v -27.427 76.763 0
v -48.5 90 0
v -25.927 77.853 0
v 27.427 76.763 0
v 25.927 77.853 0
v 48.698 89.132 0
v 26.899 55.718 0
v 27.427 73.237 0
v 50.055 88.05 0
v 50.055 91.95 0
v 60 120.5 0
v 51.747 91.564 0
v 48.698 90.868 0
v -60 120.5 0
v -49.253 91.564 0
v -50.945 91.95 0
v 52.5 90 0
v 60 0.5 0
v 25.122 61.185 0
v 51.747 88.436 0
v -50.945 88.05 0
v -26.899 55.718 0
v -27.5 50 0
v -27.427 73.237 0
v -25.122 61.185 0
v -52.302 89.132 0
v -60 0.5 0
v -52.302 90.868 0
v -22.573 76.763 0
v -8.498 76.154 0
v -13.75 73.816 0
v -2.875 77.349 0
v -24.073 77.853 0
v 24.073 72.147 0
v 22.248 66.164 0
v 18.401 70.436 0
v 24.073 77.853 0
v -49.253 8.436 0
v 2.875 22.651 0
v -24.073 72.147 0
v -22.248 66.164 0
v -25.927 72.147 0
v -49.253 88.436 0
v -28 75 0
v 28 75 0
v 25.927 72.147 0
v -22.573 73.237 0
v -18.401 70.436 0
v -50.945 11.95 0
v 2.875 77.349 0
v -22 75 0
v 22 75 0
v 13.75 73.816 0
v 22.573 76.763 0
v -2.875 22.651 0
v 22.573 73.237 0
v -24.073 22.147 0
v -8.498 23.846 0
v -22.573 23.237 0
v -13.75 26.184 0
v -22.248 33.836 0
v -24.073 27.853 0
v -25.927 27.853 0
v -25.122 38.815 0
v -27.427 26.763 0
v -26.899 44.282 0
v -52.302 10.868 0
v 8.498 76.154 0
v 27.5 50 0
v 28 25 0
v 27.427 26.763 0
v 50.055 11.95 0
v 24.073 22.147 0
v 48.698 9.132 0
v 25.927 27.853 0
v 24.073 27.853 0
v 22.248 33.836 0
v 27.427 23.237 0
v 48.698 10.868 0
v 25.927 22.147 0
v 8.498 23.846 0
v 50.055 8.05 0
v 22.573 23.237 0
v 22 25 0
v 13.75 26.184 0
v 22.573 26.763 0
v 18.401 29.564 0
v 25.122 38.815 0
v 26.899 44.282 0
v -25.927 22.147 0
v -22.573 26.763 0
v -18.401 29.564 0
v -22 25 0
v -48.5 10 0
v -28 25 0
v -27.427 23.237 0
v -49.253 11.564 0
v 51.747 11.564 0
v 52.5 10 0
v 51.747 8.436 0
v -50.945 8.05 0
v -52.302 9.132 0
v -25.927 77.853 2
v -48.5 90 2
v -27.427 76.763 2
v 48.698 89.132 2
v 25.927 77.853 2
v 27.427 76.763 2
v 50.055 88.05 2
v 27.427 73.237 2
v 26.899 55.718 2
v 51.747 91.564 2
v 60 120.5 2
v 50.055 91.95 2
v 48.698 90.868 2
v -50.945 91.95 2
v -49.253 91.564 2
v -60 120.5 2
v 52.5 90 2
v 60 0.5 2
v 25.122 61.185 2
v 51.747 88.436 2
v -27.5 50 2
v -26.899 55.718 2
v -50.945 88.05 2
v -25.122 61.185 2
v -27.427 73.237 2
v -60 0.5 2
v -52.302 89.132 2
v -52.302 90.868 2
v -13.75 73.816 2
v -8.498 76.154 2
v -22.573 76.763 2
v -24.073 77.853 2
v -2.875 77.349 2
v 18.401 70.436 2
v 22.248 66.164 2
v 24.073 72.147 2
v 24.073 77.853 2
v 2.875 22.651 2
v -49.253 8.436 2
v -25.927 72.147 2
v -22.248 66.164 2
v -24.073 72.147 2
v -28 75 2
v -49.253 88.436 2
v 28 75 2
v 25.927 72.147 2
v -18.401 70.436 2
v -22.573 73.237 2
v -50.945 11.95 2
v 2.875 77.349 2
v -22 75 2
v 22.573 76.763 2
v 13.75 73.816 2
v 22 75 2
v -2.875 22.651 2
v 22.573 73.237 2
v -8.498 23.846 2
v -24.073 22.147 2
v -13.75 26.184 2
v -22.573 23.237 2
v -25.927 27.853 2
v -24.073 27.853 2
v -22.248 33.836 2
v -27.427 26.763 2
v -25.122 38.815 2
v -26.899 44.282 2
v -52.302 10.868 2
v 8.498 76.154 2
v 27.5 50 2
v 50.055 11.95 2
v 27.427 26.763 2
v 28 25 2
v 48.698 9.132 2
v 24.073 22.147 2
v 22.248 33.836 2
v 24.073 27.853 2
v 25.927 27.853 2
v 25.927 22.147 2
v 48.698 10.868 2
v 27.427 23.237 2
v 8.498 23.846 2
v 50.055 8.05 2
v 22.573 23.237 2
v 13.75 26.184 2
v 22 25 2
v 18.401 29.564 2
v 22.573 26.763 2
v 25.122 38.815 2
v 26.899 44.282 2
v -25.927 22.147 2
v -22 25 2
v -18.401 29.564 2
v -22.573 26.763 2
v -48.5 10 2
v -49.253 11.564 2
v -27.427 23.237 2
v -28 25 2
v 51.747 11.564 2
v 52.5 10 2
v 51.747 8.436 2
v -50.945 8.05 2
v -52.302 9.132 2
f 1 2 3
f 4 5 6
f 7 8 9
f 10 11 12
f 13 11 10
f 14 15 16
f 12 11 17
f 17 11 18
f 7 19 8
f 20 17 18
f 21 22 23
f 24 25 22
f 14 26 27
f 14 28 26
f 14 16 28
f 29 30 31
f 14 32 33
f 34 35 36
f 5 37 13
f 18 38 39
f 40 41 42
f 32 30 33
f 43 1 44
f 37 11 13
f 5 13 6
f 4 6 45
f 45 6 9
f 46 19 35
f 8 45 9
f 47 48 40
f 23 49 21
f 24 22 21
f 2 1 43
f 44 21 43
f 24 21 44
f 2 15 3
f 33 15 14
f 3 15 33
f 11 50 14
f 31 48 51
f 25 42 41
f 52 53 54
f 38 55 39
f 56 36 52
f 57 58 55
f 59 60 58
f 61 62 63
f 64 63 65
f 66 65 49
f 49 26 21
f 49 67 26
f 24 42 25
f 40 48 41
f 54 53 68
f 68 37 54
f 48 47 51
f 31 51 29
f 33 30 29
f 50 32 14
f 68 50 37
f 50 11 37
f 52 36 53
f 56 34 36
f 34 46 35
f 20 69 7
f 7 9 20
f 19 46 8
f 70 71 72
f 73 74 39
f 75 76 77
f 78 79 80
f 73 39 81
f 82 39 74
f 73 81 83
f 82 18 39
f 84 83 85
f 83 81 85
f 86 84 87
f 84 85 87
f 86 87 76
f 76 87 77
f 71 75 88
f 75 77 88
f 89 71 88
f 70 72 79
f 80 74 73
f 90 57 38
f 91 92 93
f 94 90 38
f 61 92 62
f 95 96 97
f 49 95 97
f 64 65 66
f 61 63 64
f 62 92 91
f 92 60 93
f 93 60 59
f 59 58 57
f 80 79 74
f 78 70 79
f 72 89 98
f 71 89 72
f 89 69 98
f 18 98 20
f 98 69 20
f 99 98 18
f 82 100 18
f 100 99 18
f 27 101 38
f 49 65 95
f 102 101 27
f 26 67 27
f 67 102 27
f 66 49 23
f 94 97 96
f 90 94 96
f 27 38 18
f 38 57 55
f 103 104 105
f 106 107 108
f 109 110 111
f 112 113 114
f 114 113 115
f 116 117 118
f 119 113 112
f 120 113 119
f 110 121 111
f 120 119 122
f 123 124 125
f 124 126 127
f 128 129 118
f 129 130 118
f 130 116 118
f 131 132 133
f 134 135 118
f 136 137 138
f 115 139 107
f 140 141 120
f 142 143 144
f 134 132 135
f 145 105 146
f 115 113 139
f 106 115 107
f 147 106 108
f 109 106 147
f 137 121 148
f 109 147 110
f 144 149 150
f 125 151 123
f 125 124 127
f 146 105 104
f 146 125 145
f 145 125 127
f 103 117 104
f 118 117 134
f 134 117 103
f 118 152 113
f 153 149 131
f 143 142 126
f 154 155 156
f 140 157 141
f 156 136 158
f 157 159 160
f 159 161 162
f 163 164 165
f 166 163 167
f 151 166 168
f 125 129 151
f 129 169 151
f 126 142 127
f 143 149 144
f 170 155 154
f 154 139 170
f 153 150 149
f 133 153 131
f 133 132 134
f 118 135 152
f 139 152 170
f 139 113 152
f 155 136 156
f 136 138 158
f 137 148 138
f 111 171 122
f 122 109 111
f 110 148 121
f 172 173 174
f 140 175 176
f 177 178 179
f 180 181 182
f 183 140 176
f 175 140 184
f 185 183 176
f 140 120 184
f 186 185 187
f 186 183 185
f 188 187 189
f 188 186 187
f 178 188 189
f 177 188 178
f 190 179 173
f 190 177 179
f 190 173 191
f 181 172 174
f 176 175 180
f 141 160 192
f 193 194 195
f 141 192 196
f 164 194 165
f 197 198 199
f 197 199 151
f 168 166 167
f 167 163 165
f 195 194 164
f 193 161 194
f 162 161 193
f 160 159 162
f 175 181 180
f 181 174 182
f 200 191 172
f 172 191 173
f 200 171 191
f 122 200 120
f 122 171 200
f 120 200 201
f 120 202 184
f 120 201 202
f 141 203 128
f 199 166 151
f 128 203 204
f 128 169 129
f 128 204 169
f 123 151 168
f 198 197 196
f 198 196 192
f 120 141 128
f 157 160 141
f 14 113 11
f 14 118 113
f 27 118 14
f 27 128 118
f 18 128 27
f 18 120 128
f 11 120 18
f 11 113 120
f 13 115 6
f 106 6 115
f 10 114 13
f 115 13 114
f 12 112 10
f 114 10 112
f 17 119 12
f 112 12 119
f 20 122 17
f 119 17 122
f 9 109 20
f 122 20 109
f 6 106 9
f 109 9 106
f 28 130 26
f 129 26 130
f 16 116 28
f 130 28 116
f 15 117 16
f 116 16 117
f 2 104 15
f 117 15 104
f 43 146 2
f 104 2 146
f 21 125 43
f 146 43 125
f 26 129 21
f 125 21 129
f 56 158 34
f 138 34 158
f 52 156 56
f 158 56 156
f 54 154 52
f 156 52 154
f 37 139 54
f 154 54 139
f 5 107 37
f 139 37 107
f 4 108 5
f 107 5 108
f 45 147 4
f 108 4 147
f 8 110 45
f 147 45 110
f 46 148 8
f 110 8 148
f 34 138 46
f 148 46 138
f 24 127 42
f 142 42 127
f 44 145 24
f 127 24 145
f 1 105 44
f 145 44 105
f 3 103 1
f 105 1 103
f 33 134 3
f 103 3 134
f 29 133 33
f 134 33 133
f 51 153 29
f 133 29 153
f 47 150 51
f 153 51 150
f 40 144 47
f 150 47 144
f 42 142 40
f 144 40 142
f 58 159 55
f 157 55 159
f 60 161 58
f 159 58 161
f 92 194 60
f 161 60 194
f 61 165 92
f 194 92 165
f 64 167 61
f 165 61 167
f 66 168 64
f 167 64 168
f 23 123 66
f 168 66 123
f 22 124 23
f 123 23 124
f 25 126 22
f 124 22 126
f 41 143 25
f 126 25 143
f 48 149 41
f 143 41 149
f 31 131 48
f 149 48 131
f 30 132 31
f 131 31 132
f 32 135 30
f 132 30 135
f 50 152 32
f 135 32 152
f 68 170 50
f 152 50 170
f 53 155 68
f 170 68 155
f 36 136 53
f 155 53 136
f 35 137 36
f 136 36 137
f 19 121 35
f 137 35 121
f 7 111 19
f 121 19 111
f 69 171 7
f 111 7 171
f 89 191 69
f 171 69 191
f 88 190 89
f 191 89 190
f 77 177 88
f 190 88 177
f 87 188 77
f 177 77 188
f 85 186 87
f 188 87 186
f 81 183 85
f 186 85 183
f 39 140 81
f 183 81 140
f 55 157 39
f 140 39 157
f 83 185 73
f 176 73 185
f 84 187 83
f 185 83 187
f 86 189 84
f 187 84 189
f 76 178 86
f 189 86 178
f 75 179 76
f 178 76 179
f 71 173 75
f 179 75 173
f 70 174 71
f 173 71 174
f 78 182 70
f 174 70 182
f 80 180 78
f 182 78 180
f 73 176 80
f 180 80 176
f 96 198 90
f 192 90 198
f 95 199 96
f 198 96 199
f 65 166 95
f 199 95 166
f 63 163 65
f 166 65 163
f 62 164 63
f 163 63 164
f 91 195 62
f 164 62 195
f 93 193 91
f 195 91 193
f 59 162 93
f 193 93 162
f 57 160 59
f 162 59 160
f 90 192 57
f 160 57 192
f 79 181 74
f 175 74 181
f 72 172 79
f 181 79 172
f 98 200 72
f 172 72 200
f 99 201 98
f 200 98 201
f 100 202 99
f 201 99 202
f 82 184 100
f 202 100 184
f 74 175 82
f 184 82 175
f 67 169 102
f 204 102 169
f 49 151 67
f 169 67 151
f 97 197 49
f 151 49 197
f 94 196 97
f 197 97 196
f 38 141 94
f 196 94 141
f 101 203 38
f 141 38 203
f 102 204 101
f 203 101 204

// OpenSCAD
thick = 2;
base = [125, 105 + 20];
mount_hole_diameter = 4;
fan_hole_diameter = 6;

module fan()
{
    circle(d=55);
    translate([25,25,0]) circle(d=fan_hole_diameter);
    translate([25,-25,0]) circle(d=fan_hole_diameter);
    translate([-25,25,0]) circle(d=fan_hole_diameter);
    translate([-25,-25,0]) circle(d=fan_hole_diameter);
};

linear_extrude(height=thick)
difference()
{
    translate([-base.x/2, -thick, 0])
    offset(r=-thick-0.5) square(base);
    translate([base.x/2 - thick - 10 ,10]) circle(d=mount_hole_diameter);
    translate([-base.x/2 + thick + 10 ,10]) circle(d=mount_hole_diameter);
    translate([base.x/2 - thick - 10 ,10 + 80]) circle(d=mount_hole_diameter);
    translate([-base.x/2 + thick + 10 ,10 + 80]) circle(d=mount_hole_diameter);
    translate([0, 50,0]) fan();
};
